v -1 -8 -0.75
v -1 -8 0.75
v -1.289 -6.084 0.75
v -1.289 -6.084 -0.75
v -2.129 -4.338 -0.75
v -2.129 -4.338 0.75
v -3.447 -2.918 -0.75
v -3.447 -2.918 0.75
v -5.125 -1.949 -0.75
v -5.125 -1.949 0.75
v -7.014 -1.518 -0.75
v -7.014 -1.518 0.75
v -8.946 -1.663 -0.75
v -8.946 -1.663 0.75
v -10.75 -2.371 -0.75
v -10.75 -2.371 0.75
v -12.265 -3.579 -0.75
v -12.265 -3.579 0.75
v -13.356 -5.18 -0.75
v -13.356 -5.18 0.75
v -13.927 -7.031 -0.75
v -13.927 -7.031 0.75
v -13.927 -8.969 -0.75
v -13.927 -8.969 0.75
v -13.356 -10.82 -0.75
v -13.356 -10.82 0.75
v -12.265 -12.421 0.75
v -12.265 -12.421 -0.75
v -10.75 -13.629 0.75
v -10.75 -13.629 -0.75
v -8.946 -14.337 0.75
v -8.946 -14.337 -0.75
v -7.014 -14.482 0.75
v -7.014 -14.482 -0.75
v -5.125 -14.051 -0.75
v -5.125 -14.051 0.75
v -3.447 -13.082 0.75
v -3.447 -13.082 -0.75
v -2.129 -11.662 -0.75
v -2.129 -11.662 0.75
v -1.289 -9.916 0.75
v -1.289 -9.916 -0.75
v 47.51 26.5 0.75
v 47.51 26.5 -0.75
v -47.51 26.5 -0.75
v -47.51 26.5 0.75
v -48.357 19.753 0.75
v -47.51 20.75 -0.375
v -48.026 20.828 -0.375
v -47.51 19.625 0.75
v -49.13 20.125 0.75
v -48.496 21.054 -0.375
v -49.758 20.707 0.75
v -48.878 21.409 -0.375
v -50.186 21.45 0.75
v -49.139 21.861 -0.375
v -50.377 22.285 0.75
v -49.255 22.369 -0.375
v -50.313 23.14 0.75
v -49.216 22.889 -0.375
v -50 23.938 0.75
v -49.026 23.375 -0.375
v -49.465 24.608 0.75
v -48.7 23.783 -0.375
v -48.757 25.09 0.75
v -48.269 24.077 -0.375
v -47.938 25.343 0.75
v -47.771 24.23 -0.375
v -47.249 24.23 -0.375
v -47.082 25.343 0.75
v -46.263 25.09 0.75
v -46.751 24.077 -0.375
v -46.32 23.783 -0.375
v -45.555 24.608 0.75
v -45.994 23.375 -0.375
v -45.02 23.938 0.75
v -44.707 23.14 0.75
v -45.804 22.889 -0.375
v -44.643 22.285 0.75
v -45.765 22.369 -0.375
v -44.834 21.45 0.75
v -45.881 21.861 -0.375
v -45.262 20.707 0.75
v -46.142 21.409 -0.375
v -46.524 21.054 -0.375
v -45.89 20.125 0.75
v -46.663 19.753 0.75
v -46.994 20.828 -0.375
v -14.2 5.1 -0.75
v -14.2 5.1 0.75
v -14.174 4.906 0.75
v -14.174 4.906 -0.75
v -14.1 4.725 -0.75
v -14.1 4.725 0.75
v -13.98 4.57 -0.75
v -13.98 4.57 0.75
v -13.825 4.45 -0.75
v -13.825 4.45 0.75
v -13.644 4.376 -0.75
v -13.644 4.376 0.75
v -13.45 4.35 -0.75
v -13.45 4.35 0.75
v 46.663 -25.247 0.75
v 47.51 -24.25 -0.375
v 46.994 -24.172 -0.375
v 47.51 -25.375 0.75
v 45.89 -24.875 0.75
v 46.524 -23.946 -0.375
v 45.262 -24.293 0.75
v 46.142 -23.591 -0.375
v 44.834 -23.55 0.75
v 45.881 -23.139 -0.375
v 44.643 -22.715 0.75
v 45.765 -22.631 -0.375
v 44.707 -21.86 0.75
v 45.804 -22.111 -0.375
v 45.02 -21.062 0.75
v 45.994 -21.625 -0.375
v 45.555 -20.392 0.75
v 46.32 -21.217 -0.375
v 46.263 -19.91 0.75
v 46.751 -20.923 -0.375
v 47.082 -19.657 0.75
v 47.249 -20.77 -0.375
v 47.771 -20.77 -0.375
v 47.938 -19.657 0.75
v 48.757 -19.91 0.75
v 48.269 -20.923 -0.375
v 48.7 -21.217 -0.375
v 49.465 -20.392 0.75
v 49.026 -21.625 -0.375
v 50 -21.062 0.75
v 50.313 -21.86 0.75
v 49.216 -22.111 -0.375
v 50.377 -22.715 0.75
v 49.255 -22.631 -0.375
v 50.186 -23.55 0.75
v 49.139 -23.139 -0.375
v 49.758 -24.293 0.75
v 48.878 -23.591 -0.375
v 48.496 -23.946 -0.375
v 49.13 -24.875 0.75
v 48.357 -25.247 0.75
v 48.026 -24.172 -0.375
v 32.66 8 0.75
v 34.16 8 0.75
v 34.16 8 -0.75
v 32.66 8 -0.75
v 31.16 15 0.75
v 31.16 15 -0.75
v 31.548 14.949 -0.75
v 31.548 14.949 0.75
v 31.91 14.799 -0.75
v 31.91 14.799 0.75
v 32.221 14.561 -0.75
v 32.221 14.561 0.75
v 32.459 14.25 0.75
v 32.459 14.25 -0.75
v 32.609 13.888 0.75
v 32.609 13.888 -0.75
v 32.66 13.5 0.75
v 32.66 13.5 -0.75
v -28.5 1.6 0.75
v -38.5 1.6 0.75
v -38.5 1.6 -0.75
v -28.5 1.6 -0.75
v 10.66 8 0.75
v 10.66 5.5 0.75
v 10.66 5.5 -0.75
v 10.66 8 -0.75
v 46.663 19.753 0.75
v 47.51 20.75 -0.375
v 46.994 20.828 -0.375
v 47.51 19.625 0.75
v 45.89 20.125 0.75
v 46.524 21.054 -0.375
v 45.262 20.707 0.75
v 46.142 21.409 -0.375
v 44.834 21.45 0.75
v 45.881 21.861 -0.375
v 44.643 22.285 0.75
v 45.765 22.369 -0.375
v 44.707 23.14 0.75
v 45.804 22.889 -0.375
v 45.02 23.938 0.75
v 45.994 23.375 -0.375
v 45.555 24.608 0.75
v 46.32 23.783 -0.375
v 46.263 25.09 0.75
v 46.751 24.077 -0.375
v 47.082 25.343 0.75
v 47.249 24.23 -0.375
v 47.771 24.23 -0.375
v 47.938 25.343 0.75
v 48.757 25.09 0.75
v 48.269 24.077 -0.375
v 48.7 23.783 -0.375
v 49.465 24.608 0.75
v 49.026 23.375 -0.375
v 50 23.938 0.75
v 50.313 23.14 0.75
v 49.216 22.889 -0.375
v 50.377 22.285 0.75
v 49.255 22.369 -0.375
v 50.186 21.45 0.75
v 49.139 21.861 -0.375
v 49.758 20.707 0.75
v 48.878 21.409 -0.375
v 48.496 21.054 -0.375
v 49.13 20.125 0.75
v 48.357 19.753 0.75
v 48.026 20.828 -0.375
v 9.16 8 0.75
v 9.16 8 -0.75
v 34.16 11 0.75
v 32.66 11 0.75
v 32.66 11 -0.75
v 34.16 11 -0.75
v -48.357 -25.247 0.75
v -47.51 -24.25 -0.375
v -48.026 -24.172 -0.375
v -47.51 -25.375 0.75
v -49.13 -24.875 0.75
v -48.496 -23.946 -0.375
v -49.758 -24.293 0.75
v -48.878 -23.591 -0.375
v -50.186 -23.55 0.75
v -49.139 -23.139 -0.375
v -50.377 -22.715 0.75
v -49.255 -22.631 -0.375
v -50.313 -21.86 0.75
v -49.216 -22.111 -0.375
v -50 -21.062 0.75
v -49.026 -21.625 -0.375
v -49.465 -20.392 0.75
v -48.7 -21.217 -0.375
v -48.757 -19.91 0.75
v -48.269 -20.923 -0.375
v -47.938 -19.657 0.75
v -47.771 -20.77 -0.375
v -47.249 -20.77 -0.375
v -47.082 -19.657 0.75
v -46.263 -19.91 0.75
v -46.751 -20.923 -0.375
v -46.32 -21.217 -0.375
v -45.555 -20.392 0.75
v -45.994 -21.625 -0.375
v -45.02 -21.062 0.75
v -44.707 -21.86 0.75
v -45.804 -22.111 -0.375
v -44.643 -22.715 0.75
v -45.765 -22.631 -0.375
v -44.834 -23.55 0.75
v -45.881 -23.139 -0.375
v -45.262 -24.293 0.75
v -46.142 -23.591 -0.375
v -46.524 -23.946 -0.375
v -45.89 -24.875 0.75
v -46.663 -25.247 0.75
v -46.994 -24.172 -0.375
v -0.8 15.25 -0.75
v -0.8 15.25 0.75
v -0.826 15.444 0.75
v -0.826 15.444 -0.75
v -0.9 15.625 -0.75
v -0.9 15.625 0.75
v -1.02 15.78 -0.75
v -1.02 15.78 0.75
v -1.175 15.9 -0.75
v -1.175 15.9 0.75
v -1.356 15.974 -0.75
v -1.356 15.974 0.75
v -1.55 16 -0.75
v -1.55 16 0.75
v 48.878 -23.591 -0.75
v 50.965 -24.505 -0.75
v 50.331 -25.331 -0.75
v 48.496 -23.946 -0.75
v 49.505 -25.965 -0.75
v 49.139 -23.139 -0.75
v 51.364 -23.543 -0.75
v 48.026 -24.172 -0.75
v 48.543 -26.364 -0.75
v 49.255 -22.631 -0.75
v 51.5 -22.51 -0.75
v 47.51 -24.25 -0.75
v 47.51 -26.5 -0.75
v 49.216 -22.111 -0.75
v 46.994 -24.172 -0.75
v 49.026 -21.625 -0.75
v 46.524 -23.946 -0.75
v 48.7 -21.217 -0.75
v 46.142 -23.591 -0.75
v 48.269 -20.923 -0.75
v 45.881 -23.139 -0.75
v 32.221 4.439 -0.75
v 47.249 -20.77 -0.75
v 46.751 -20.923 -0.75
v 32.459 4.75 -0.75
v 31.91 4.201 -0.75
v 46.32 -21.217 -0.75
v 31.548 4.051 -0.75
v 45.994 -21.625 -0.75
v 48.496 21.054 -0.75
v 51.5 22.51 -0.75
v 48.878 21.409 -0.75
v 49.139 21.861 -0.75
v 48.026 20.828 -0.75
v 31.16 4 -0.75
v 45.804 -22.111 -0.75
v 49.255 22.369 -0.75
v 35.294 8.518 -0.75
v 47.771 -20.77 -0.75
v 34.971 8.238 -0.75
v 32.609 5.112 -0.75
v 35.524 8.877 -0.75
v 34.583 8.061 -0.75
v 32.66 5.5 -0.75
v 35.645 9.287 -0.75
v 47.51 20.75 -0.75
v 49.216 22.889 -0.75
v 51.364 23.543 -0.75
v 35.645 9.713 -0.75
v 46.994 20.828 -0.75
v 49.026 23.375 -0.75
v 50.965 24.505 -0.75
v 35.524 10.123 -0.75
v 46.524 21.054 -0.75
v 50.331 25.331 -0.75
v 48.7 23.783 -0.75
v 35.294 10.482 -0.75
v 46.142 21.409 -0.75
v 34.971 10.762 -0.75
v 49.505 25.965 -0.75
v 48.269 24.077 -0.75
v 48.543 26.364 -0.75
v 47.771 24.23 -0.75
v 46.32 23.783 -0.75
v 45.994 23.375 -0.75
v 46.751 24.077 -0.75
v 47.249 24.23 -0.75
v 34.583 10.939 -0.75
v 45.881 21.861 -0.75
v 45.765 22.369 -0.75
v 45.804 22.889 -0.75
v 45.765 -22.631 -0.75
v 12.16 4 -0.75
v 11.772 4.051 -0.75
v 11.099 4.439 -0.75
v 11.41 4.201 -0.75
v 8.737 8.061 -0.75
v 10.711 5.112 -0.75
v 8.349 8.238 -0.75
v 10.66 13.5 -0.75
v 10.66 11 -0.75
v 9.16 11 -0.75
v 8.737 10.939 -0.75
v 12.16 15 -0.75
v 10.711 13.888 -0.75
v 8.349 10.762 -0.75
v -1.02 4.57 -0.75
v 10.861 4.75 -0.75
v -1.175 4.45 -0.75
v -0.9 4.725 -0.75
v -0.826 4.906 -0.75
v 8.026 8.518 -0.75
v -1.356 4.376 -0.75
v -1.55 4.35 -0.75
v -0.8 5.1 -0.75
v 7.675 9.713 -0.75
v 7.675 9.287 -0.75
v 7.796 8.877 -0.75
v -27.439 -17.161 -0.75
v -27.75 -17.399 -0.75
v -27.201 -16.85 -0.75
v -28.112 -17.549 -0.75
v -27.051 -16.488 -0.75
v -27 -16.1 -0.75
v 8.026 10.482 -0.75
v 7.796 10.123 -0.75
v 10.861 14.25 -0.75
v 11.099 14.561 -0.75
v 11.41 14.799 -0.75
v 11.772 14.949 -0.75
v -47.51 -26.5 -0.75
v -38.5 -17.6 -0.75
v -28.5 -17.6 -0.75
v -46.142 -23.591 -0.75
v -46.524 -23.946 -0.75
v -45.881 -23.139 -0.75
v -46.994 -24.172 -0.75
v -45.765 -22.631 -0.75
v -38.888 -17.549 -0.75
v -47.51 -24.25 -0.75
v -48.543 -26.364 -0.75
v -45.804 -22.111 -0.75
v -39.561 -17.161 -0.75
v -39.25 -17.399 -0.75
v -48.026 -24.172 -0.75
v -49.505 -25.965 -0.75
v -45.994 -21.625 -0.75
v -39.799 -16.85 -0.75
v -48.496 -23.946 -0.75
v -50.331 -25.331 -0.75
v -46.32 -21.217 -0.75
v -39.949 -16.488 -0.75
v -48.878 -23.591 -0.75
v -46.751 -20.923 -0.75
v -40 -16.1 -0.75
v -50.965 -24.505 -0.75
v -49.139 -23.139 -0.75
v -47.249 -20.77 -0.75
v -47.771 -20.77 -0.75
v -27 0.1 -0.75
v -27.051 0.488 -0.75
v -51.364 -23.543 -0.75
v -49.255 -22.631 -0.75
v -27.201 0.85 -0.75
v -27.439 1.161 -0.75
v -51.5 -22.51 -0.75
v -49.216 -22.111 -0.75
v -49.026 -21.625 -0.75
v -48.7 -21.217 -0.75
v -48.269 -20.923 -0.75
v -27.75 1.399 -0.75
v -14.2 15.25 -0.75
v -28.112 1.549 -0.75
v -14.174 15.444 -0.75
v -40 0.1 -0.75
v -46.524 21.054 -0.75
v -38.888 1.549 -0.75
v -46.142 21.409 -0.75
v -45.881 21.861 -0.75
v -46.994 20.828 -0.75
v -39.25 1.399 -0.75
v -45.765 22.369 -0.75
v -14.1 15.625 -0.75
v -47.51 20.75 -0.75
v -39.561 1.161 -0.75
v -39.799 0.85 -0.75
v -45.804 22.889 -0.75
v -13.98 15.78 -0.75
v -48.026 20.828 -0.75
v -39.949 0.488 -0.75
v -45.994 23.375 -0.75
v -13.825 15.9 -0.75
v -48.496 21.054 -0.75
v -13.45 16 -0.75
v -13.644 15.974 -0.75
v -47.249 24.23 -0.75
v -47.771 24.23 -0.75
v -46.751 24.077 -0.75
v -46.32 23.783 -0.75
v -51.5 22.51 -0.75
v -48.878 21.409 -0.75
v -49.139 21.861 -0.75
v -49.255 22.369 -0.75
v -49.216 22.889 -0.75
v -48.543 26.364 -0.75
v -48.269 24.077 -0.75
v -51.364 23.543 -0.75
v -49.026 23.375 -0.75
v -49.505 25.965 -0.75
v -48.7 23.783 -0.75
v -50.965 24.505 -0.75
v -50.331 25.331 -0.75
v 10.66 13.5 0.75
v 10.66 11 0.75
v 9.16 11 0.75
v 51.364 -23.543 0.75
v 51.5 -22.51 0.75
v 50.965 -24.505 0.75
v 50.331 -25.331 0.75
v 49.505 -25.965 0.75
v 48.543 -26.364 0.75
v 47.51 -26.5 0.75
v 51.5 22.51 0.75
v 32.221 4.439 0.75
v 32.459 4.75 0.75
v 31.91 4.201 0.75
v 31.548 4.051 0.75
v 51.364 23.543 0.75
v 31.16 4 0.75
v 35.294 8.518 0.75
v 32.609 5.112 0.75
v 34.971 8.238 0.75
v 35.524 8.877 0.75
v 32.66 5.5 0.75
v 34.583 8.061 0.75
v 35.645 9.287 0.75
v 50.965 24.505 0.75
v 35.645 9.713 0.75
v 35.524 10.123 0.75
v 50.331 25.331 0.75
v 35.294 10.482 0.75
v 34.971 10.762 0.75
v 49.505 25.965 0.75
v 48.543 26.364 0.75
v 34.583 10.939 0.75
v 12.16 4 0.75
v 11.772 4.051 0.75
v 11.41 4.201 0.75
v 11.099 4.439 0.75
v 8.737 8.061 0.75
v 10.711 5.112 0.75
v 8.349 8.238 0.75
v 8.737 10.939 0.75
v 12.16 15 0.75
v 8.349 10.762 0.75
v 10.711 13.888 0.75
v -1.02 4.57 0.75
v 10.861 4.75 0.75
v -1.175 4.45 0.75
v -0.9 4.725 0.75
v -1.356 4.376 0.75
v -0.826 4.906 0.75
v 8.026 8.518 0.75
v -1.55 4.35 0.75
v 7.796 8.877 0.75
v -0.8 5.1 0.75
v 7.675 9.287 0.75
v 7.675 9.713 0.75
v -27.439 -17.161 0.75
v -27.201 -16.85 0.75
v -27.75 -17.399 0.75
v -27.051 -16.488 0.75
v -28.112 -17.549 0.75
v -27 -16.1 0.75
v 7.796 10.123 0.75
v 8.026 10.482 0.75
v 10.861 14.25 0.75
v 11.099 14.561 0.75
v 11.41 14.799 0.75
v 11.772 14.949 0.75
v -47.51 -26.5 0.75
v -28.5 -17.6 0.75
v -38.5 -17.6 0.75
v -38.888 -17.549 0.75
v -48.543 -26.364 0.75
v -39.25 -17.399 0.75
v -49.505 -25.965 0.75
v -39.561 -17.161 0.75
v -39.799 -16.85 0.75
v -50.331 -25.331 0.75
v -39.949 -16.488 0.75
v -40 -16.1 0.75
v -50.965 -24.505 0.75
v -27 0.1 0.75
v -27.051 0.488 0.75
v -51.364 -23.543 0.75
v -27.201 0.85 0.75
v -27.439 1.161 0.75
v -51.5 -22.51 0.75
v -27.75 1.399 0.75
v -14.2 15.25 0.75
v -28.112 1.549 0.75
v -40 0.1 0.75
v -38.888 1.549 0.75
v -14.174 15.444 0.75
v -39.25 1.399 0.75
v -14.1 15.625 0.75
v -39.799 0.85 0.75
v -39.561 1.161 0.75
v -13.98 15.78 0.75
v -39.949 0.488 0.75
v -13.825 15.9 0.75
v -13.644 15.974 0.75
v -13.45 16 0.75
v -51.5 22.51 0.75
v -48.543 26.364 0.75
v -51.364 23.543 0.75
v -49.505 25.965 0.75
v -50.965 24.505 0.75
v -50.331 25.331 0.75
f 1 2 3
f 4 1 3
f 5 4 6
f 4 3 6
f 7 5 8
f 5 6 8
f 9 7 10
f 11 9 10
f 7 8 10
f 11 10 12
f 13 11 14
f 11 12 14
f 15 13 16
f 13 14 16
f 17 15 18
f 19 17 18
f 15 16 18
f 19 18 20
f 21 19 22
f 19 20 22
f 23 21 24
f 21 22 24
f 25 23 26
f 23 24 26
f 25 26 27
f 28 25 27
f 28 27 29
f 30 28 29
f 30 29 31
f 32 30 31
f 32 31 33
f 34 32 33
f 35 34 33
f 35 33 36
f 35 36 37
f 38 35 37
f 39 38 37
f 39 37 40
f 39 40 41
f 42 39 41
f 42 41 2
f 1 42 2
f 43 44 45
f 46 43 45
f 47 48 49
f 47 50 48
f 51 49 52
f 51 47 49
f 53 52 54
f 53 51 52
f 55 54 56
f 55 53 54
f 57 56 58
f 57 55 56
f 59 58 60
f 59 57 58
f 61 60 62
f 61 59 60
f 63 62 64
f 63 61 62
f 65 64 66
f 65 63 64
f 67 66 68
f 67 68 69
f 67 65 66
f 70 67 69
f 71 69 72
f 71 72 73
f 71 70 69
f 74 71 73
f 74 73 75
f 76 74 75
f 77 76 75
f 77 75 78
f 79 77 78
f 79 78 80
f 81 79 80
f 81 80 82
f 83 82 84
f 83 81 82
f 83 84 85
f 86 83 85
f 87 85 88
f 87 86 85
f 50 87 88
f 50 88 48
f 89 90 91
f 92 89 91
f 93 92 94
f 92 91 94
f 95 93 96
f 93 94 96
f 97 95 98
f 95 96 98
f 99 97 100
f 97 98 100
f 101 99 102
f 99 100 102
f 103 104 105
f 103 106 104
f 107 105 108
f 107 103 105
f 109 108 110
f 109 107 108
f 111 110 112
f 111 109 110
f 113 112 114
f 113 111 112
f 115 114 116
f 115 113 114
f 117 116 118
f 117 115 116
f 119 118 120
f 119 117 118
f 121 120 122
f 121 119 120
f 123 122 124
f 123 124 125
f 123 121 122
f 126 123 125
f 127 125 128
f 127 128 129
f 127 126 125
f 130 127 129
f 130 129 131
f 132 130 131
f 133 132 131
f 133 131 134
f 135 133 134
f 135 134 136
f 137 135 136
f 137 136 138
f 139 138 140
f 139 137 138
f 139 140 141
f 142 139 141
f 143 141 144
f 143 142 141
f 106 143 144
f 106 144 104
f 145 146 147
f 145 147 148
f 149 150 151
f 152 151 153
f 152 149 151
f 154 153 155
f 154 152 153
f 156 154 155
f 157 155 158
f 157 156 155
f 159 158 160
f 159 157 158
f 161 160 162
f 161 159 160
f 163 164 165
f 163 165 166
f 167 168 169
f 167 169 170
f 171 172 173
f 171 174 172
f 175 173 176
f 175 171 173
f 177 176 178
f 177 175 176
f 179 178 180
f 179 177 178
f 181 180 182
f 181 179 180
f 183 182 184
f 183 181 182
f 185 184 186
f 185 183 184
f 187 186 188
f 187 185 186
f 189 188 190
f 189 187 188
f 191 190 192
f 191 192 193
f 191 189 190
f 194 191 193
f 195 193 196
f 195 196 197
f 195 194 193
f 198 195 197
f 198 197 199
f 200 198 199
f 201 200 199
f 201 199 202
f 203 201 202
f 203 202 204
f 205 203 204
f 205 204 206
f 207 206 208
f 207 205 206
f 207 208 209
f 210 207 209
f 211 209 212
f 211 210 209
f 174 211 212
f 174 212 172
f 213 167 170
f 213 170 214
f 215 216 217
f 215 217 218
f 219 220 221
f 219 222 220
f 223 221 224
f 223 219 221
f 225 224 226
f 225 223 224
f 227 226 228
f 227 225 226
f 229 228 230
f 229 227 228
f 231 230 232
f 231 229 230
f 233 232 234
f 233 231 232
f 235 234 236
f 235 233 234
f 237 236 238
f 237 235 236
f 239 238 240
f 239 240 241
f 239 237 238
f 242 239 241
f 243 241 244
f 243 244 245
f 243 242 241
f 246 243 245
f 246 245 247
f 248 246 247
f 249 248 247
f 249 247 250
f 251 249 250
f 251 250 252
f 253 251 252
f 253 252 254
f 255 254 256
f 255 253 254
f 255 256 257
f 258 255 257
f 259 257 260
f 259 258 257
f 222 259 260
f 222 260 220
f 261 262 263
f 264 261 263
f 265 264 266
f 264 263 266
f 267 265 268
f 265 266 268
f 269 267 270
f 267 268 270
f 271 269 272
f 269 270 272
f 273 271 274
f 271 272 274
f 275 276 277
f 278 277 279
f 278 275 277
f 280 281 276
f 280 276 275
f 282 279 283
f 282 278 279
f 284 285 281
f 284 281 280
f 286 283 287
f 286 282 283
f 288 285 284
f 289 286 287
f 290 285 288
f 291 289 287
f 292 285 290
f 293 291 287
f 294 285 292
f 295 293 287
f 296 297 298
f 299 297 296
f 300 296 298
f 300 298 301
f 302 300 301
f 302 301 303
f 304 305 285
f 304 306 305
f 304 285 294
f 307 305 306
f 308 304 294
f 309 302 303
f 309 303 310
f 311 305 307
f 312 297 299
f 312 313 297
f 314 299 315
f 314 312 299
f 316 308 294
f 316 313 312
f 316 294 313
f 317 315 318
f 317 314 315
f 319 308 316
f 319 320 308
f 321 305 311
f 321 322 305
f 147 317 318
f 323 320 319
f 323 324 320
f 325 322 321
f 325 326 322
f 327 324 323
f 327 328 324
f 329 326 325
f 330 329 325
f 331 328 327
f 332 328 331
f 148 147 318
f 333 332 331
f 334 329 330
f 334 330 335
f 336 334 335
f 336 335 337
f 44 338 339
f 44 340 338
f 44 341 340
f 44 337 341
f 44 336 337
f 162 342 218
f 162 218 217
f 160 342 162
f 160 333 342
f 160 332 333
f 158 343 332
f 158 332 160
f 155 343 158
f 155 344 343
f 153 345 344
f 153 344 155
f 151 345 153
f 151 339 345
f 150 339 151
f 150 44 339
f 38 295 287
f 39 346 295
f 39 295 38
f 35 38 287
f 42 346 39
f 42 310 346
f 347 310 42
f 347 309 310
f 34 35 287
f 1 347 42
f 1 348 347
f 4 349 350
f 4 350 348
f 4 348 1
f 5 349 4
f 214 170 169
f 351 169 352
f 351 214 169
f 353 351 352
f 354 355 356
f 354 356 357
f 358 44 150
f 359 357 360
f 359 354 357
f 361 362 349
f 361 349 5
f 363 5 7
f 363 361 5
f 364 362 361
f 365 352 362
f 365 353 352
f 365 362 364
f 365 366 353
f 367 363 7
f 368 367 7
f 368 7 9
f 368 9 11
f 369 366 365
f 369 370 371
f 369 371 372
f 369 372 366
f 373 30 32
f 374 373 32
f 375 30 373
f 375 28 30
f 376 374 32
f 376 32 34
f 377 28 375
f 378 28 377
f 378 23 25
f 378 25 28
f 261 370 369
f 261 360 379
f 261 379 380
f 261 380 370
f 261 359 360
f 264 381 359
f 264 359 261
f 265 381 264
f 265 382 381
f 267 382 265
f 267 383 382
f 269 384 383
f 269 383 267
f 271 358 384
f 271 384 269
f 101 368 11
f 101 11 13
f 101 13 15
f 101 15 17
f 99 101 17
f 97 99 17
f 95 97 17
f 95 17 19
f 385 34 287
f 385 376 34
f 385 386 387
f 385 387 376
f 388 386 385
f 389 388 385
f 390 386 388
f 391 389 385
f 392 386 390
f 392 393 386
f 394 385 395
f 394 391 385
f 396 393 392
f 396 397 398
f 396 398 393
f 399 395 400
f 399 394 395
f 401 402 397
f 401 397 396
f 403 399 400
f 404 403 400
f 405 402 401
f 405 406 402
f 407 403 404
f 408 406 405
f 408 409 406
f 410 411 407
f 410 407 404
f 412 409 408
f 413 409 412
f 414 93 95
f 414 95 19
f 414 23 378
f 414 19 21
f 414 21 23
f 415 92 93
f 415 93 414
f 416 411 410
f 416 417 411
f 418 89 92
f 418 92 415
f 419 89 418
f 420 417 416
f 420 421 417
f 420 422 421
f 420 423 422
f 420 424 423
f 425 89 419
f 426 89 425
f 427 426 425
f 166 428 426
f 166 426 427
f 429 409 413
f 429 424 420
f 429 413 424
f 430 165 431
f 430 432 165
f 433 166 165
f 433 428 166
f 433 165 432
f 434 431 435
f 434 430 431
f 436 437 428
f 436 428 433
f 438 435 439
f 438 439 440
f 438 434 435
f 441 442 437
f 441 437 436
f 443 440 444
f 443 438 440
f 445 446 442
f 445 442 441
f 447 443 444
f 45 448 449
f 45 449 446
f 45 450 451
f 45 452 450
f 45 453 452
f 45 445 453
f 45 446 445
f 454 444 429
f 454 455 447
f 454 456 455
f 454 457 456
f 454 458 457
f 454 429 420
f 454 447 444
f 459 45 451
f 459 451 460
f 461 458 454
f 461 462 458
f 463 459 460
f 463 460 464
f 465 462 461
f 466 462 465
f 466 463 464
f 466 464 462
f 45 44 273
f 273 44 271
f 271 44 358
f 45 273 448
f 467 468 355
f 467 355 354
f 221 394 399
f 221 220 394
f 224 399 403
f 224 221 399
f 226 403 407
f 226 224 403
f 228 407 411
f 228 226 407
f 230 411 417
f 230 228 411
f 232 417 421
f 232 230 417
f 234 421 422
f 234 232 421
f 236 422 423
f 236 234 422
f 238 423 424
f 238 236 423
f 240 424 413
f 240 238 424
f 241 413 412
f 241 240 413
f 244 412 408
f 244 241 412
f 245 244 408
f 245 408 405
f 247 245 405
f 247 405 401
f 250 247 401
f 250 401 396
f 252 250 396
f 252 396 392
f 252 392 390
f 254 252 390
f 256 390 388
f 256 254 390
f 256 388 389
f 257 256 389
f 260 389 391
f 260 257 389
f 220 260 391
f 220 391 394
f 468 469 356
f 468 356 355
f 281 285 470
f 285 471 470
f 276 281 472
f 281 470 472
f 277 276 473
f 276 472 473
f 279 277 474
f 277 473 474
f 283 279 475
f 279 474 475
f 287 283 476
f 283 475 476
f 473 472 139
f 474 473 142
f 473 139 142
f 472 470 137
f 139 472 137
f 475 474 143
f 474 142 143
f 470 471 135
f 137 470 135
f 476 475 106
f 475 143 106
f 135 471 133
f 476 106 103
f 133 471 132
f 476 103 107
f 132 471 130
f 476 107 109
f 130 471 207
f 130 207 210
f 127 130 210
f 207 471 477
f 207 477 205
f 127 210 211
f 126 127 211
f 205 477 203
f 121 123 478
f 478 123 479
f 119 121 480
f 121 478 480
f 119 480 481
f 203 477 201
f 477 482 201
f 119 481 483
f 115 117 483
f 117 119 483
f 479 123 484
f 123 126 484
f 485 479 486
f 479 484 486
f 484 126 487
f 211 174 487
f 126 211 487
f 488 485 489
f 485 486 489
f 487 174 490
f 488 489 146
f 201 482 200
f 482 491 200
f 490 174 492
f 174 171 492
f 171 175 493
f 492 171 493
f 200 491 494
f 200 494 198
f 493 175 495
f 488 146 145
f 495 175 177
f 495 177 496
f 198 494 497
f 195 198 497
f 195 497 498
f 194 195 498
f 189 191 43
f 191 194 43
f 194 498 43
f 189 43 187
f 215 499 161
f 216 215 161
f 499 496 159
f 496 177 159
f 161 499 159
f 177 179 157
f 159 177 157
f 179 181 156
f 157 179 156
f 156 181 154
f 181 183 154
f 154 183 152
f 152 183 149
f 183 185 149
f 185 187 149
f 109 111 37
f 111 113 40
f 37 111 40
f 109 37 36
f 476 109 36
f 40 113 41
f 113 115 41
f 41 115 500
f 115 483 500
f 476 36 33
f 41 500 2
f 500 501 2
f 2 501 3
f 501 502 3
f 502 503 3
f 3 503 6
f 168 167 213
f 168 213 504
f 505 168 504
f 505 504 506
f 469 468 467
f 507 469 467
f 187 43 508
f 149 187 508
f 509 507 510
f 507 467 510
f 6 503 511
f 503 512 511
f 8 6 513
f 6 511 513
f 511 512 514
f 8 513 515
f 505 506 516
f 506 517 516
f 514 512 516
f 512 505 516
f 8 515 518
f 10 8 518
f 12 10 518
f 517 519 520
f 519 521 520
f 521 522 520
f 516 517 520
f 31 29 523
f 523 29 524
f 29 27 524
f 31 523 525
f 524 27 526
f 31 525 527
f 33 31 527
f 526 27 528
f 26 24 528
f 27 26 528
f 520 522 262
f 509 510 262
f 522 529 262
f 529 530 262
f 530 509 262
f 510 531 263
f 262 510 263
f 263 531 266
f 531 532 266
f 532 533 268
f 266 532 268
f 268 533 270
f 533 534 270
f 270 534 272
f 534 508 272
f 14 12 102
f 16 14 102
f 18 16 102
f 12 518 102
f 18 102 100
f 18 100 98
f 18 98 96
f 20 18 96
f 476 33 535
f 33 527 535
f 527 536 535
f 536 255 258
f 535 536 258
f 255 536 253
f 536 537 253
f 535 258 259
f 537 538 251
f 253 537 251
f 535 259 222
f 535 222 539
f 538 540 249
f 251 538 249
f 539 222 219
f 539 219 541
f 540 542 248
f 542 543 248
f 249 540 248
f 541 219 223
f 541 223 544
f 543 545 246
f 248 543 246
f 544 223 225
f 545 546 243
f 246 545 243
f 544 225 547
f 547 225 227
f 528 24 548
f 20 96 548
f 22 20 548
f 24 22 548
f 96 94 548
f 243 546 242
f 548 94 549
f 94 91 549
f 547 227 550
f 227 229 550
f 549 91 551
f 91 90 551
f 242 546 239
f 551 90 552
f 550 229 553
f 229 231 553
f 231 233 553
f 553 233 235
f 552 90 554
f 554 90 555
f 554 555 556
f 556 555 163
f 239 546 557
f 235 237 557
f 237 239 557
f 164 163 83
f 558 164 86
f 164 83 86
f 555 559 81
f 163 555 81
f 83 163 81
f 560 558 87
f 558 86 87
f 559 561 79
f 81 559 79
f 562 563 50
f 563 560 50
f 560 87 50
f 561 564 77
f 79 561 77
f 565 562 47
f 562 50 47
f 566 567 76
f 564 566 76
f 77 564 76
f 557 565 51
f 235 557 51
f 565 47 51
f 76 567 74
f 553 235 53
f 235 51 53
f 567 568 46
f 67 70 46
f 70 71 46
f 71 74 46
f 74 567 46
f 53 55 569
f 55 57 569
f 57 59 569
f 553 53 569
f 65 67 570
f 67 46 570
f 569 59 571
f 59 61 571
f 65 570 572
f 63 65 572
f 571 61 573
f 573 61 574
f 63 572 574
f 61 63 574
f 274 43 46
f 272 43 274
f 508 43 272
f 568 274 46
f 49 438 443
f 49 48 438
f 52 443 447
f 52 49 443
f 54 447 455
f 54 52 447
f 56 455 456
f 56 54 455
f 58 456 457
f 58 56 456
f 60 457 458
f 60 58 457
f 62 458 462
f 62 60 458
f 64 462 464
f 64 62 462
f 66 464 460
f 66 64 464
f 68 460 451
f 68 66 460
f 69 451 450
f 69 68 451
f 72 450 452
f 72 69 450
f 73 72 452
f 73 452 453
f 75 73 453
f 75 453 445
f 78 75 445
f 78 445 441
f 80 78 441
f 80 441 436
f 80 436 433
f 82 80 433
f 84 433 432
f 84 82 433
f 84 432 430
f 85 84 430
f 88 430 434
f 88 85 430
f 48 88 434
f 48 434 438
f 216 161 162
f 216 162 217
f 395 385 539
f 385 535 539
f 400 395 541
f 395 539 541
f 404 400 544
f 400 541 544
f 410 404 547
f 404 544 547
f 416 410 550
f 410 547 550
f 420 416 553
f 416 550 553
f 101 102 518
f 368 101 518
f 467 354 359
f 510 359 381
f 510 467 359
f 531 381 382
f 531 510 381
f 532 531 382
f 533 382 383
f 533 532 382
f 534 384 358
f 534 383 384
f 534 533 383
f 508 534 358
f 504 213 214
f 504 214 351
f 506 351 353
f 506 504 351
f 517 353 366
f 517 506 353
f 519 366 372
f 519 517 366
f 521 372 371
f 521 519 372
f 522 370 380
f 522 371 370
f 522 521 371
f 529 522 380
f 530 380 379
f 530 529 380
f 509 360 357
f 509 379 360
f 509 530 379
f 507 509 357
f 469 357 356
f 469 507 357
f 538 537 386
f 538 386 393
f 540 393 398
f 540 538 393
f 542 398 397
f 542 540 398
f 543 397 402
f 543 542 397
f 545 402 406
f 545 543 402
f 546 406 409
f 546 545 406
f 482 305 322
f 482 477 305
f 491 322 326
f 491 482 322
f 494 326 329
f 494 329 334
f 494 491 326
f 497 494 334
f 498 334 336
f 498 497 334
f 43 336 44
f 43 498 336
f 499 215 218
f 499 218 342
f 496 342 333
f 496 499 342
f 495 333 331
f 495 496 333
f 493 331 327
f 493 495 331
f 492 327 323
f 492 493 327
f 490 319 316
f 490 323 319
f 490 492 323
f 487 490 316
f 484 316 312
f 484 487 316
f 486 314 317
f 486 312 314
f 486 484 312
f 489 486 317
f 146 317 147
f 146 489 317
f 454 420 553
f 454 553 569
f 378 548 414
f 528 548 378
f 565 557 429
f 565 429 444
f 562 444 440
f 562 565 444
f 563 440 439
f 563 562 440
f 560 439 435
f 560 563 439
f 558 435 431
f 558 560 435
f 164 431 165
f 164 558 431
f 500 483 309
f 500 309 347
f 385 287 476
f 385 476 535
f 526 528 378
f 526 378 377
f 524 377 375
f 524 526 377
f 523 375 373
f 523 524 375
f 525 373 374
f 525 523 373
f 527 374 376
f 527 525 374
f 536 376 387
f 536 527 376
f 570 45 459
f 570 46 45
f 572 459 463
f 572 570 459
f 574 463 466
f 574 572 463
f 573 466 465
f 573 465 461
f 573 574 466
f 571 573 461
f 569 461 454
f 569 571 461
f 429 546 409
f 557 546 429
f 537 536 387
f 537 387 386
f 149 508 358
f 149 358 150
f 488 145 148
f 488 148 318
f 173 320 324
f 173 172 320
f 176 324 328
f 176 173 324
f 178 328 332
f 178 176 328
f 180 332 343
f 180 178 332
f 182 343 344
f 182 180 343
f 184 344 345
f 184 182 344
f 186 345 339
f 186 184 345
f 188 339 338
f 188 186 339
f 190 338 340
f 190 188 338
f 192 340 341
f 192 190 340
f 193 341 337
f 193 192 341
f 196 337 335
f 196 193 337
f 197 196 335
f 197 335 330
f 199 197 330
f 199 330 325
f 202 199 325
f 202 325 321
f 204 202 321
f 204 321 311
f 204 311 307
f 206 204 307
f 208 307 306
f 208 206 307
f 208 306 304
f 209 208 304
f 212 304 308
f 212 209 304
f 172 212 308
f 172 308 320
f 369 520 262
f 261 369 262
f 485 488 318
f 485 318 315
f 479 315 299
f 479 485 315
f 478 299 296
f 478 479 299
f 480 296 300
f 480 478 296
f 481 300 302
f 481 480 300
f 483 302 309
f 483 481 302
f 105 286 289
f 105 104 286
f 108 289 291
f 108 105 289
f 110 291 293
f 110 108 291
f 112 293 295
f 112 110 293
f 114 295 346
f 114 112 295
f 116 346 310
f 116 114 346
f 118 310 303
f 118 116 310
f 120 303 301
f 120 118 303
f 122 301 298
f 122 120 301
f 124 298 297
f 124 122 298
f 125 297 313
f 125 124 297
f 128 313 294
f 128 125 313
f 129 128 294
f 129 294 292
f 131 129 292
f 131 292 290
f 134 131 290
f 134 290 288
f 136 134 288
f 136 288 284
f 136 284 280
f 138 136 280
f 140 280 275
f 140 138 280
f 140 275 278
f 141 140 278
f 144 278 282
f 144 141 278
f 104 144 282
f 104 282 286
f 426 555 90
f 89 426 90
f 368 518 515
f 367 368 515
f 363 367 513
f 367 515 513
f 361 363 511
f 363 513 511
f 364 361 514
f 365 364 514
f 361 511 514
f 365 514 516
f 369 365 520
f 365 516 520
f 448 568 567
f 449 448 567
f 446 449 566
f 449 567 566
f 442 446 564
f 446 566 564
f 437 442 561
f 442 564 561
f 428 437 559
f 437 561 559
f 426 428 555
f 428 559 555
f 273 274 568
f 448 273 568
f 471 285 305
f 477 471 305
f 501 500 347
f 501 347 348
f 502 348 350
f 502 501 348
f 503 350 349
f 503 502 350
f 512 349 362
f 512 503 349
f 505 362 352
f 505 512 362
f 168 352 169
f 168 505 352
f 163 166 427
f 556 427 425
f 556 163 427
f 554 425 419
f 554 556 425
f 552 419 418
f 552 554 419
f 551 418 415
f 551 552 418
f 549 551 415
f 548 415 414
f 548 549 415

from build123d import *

# Parameters (mm, degrees)
ESQUISSE1_W                                 = 103
ESQUISSE1_H                                 = 53
BOSS_EXTRU_1_DEPTH                          = 1.5
FRAISAGE_POUR_VIS_T_TE_FRAIS_E_M31_AT_COUNT = 2
FRAISAGE_POUR_VIS_T_TE_FRAIS_E_M31_AT_PITCH = 95.02
FRAISAGE_POUR_VIS_T_TE_FRAIS_E_M31_2_COUNT  = 2
FRAISAGE_POUR_VIS_T_TE_FRAIS_E_M31_2_PITCH  = 105.137055314
FRAISAGE_POUR_VIS_T_TE_FRAIS_E_M31_3_COUNT  = 2
FRAISAGE_POUR_VIS_T_TE_FRAIS_E_M31_3_PITCH  = 45
CONG_1_R                                    = 3.99
ESQUISSE5_R                                 = 6.5
ENL_V_MAT_EXTRU_1_DEPTH                     = 2.5


with BuildPart() as part:
    # Esquisse1 → Boss.-Extru.1 (new body)
    with BuildSketch(Plane(origin=(0, 0, -0.75), x_dir=(-1, 0, 0), z_dir=(0, 0, -1))):
        Rectangle(ESQUISSE1_W, ESQUISSE1_H)
    extrude(amount=-BOSS_EXTRU_1_DEPTH)

    # Esquisse2 → Fraisage pour vis à tête fraisée M31 (revolve, cut)
    with BuildSketch(Plane(origin=(-47.51, 22.5, 0.75), x_dir=(0, -1, 0), z_dir=(1, 0, 0))):
        Polygon((0, 0), (0, 1.5), (1.75, 1.5), (1.75, 1.125), (2.875, 0), align=None)
    fraisage_pour_vis_t_te_frais_e_m31 = revolve(axis=Axis((-47.51, 22.5, 7.1), (0, 0, -1)), mode=Mode.SUBTRACT)

    # Fraisage pour vis à tête fraisée M31 at: Fraisage pour vis à tête fraisée M31 ×2
    with Locations(*[(i * FRAISAGE_POUR_VIS_T_TE_FRAIS_E_M31_AT_PITCH, 0, 0) for i in range(1, FRAISAGE_POUR_VIS_T_TE_FRAIS_E_M31_AT_COUNT)]):
        add(fraisage_pour_vis_t_te_frais_e_m31, mode=Mode.SUBTRACT)

    # Fraisage pour vis _ t_te frais_e M31 2: Fraisage pour vis à tête fraisée M31 ×2
    with Locations(*[Vector(0.903772697, -0.428012748, 0) * (i * FRAISAGE_POUR_VIS_T_TE_FRAIS_E_M31_2_PITCH) for i in range(1, FRAISAGE_POUR_VIS_T_TE_FRAIS_E_M31_2_COUNT)]):
        add(fraisage_pour_vis_t_te_frais_e_m31, mode=Mode.SUBTRACT)

    # Fraisage pour vis _ t_te frais_e M31 3: Fraisage pour vis à tête fraisée M31 ×2
    with Locations(*[(0, -i * FRAISAGE_POUR_VIS_T_TE_FRAIS_E_M31_3_PITCH, 0) for i in range(1, FRAISAGE_POUR_VIS_T_TE_FRAIS_E_M31_3_COUNT)]):
        add(fraisage_pour_vis_t_te_frais_e_m31, mode=Mode.SUBTRACT)

    # Congé1
    cong_1_edges = [part.edges().sort_by_distance(p)[0] for p in [
        (51.5, 26.5, 0),
        (-51.5, 26.5, 0),
        (-51.5, -26.5, 0),
        (51.5, -26.5, 0),
    ]]
    fillet(cong_1_edges, radius=CONG_1_R)

    # Esquisse5 → Enlèv. mat.-Extru.1 (cut, through all)
    with BuildSketch(Plane.XY.offset(0.75)):
        with Locations((-7.5, -8)):
            Circle(ESQUISSE5_R)
        with BuildLine():
            Line((-28.5, -17.6), (-38.5, -17.6))
            ThreePointArc((-38.5, -17.6), (-39.560660172, -17.160660172), (-40, -16.1))
            Line((-40, -16.1), (-40, 0.1))
            ThreePointArc((-40, 0.1), (-39.560660172, 1.160660172), (-38.5, 1.6))
            Line((-38.5, 1.6), (-28.5, 1.6))
            ThreePointArc((-28.5, 1.6), (-27.439339828, 1.160660172), (-27, 0.1))
            Line((-27, 0.1), (-27, -16.1))
            ThreePointArc((-27, -16.1), (-27.439339828, -17.160660172), (-28.5, -17.6))
        make_face()
        with BuildLine():
            Line((31.16, 4), (12.16, 4))
            ThreePointArc((12.16, 4), (11.099339828, 4.439339828), (10.66, 5.5))
            Line((10.66, 5.5), (10.66, 8))
            Line((10.66, 8), (9.16, 8))
            ThreePointArc((9.16, 8), (7.66, 9.5), (9.16, 11))
            Line((9.16, 11), (10.66, 11))
            Line((10.66, 11), (10.66, 13.5))
            ThreePointArc((10.66, 13.5), (11.099339828, 14.560660172), (12.16, 15))
            Line((12.16, 15), (31.16, 15))
            ThreePointArc((31.16, 15), (32.220660172, 14.560660172), (32.66, 13.5))
            Line((32.66, 13.5), (32.66, 11))
            Line((32.66, 11), (34.16, 11))
            ThreePointArc((34.16, 11), (35.66, 9.5), (34.16, 8))
            Line((34.16, 8), (32.66, 8))
            Line((32.66, 8), (32.66, 5.5))
            ThreePointArc((32.66, 5.5), (32.220660172, 4.439339828), (31.16, 4))
        make_face()
        with BuildLine():
            Line((-13.45, 4.35), (-1.55, 4.35))
            ThreePointArc((-1.55, 4.35), (-1.019669914, 4.569669914), (-0.8, 5.1))
            Line((-0.8, 5.1), (-0.8, 15.25))
            ThreePointArc((-0.8, 15.25), (-1.019669914, 15.780330086), (-1.55, 16))
            Line((-1.55, 16), (-13.45, 16))
            ThreePointArc((-13.45, 16), (-13.980330086, 15.780330086), (-14.2, 15.25))
            Line((-14.2, 15.25), (-14.2, 5.1))
            ThreePointArc((-14.2, 5.1), (-13.980330086, 4.569669914), (-13.45, 4.35))
        make_face()
    extrude(amount=-ENL_V_MAT_EXTRU_1_DEPTH, mode=Mode.SUBTRACT)


solid = part.part
